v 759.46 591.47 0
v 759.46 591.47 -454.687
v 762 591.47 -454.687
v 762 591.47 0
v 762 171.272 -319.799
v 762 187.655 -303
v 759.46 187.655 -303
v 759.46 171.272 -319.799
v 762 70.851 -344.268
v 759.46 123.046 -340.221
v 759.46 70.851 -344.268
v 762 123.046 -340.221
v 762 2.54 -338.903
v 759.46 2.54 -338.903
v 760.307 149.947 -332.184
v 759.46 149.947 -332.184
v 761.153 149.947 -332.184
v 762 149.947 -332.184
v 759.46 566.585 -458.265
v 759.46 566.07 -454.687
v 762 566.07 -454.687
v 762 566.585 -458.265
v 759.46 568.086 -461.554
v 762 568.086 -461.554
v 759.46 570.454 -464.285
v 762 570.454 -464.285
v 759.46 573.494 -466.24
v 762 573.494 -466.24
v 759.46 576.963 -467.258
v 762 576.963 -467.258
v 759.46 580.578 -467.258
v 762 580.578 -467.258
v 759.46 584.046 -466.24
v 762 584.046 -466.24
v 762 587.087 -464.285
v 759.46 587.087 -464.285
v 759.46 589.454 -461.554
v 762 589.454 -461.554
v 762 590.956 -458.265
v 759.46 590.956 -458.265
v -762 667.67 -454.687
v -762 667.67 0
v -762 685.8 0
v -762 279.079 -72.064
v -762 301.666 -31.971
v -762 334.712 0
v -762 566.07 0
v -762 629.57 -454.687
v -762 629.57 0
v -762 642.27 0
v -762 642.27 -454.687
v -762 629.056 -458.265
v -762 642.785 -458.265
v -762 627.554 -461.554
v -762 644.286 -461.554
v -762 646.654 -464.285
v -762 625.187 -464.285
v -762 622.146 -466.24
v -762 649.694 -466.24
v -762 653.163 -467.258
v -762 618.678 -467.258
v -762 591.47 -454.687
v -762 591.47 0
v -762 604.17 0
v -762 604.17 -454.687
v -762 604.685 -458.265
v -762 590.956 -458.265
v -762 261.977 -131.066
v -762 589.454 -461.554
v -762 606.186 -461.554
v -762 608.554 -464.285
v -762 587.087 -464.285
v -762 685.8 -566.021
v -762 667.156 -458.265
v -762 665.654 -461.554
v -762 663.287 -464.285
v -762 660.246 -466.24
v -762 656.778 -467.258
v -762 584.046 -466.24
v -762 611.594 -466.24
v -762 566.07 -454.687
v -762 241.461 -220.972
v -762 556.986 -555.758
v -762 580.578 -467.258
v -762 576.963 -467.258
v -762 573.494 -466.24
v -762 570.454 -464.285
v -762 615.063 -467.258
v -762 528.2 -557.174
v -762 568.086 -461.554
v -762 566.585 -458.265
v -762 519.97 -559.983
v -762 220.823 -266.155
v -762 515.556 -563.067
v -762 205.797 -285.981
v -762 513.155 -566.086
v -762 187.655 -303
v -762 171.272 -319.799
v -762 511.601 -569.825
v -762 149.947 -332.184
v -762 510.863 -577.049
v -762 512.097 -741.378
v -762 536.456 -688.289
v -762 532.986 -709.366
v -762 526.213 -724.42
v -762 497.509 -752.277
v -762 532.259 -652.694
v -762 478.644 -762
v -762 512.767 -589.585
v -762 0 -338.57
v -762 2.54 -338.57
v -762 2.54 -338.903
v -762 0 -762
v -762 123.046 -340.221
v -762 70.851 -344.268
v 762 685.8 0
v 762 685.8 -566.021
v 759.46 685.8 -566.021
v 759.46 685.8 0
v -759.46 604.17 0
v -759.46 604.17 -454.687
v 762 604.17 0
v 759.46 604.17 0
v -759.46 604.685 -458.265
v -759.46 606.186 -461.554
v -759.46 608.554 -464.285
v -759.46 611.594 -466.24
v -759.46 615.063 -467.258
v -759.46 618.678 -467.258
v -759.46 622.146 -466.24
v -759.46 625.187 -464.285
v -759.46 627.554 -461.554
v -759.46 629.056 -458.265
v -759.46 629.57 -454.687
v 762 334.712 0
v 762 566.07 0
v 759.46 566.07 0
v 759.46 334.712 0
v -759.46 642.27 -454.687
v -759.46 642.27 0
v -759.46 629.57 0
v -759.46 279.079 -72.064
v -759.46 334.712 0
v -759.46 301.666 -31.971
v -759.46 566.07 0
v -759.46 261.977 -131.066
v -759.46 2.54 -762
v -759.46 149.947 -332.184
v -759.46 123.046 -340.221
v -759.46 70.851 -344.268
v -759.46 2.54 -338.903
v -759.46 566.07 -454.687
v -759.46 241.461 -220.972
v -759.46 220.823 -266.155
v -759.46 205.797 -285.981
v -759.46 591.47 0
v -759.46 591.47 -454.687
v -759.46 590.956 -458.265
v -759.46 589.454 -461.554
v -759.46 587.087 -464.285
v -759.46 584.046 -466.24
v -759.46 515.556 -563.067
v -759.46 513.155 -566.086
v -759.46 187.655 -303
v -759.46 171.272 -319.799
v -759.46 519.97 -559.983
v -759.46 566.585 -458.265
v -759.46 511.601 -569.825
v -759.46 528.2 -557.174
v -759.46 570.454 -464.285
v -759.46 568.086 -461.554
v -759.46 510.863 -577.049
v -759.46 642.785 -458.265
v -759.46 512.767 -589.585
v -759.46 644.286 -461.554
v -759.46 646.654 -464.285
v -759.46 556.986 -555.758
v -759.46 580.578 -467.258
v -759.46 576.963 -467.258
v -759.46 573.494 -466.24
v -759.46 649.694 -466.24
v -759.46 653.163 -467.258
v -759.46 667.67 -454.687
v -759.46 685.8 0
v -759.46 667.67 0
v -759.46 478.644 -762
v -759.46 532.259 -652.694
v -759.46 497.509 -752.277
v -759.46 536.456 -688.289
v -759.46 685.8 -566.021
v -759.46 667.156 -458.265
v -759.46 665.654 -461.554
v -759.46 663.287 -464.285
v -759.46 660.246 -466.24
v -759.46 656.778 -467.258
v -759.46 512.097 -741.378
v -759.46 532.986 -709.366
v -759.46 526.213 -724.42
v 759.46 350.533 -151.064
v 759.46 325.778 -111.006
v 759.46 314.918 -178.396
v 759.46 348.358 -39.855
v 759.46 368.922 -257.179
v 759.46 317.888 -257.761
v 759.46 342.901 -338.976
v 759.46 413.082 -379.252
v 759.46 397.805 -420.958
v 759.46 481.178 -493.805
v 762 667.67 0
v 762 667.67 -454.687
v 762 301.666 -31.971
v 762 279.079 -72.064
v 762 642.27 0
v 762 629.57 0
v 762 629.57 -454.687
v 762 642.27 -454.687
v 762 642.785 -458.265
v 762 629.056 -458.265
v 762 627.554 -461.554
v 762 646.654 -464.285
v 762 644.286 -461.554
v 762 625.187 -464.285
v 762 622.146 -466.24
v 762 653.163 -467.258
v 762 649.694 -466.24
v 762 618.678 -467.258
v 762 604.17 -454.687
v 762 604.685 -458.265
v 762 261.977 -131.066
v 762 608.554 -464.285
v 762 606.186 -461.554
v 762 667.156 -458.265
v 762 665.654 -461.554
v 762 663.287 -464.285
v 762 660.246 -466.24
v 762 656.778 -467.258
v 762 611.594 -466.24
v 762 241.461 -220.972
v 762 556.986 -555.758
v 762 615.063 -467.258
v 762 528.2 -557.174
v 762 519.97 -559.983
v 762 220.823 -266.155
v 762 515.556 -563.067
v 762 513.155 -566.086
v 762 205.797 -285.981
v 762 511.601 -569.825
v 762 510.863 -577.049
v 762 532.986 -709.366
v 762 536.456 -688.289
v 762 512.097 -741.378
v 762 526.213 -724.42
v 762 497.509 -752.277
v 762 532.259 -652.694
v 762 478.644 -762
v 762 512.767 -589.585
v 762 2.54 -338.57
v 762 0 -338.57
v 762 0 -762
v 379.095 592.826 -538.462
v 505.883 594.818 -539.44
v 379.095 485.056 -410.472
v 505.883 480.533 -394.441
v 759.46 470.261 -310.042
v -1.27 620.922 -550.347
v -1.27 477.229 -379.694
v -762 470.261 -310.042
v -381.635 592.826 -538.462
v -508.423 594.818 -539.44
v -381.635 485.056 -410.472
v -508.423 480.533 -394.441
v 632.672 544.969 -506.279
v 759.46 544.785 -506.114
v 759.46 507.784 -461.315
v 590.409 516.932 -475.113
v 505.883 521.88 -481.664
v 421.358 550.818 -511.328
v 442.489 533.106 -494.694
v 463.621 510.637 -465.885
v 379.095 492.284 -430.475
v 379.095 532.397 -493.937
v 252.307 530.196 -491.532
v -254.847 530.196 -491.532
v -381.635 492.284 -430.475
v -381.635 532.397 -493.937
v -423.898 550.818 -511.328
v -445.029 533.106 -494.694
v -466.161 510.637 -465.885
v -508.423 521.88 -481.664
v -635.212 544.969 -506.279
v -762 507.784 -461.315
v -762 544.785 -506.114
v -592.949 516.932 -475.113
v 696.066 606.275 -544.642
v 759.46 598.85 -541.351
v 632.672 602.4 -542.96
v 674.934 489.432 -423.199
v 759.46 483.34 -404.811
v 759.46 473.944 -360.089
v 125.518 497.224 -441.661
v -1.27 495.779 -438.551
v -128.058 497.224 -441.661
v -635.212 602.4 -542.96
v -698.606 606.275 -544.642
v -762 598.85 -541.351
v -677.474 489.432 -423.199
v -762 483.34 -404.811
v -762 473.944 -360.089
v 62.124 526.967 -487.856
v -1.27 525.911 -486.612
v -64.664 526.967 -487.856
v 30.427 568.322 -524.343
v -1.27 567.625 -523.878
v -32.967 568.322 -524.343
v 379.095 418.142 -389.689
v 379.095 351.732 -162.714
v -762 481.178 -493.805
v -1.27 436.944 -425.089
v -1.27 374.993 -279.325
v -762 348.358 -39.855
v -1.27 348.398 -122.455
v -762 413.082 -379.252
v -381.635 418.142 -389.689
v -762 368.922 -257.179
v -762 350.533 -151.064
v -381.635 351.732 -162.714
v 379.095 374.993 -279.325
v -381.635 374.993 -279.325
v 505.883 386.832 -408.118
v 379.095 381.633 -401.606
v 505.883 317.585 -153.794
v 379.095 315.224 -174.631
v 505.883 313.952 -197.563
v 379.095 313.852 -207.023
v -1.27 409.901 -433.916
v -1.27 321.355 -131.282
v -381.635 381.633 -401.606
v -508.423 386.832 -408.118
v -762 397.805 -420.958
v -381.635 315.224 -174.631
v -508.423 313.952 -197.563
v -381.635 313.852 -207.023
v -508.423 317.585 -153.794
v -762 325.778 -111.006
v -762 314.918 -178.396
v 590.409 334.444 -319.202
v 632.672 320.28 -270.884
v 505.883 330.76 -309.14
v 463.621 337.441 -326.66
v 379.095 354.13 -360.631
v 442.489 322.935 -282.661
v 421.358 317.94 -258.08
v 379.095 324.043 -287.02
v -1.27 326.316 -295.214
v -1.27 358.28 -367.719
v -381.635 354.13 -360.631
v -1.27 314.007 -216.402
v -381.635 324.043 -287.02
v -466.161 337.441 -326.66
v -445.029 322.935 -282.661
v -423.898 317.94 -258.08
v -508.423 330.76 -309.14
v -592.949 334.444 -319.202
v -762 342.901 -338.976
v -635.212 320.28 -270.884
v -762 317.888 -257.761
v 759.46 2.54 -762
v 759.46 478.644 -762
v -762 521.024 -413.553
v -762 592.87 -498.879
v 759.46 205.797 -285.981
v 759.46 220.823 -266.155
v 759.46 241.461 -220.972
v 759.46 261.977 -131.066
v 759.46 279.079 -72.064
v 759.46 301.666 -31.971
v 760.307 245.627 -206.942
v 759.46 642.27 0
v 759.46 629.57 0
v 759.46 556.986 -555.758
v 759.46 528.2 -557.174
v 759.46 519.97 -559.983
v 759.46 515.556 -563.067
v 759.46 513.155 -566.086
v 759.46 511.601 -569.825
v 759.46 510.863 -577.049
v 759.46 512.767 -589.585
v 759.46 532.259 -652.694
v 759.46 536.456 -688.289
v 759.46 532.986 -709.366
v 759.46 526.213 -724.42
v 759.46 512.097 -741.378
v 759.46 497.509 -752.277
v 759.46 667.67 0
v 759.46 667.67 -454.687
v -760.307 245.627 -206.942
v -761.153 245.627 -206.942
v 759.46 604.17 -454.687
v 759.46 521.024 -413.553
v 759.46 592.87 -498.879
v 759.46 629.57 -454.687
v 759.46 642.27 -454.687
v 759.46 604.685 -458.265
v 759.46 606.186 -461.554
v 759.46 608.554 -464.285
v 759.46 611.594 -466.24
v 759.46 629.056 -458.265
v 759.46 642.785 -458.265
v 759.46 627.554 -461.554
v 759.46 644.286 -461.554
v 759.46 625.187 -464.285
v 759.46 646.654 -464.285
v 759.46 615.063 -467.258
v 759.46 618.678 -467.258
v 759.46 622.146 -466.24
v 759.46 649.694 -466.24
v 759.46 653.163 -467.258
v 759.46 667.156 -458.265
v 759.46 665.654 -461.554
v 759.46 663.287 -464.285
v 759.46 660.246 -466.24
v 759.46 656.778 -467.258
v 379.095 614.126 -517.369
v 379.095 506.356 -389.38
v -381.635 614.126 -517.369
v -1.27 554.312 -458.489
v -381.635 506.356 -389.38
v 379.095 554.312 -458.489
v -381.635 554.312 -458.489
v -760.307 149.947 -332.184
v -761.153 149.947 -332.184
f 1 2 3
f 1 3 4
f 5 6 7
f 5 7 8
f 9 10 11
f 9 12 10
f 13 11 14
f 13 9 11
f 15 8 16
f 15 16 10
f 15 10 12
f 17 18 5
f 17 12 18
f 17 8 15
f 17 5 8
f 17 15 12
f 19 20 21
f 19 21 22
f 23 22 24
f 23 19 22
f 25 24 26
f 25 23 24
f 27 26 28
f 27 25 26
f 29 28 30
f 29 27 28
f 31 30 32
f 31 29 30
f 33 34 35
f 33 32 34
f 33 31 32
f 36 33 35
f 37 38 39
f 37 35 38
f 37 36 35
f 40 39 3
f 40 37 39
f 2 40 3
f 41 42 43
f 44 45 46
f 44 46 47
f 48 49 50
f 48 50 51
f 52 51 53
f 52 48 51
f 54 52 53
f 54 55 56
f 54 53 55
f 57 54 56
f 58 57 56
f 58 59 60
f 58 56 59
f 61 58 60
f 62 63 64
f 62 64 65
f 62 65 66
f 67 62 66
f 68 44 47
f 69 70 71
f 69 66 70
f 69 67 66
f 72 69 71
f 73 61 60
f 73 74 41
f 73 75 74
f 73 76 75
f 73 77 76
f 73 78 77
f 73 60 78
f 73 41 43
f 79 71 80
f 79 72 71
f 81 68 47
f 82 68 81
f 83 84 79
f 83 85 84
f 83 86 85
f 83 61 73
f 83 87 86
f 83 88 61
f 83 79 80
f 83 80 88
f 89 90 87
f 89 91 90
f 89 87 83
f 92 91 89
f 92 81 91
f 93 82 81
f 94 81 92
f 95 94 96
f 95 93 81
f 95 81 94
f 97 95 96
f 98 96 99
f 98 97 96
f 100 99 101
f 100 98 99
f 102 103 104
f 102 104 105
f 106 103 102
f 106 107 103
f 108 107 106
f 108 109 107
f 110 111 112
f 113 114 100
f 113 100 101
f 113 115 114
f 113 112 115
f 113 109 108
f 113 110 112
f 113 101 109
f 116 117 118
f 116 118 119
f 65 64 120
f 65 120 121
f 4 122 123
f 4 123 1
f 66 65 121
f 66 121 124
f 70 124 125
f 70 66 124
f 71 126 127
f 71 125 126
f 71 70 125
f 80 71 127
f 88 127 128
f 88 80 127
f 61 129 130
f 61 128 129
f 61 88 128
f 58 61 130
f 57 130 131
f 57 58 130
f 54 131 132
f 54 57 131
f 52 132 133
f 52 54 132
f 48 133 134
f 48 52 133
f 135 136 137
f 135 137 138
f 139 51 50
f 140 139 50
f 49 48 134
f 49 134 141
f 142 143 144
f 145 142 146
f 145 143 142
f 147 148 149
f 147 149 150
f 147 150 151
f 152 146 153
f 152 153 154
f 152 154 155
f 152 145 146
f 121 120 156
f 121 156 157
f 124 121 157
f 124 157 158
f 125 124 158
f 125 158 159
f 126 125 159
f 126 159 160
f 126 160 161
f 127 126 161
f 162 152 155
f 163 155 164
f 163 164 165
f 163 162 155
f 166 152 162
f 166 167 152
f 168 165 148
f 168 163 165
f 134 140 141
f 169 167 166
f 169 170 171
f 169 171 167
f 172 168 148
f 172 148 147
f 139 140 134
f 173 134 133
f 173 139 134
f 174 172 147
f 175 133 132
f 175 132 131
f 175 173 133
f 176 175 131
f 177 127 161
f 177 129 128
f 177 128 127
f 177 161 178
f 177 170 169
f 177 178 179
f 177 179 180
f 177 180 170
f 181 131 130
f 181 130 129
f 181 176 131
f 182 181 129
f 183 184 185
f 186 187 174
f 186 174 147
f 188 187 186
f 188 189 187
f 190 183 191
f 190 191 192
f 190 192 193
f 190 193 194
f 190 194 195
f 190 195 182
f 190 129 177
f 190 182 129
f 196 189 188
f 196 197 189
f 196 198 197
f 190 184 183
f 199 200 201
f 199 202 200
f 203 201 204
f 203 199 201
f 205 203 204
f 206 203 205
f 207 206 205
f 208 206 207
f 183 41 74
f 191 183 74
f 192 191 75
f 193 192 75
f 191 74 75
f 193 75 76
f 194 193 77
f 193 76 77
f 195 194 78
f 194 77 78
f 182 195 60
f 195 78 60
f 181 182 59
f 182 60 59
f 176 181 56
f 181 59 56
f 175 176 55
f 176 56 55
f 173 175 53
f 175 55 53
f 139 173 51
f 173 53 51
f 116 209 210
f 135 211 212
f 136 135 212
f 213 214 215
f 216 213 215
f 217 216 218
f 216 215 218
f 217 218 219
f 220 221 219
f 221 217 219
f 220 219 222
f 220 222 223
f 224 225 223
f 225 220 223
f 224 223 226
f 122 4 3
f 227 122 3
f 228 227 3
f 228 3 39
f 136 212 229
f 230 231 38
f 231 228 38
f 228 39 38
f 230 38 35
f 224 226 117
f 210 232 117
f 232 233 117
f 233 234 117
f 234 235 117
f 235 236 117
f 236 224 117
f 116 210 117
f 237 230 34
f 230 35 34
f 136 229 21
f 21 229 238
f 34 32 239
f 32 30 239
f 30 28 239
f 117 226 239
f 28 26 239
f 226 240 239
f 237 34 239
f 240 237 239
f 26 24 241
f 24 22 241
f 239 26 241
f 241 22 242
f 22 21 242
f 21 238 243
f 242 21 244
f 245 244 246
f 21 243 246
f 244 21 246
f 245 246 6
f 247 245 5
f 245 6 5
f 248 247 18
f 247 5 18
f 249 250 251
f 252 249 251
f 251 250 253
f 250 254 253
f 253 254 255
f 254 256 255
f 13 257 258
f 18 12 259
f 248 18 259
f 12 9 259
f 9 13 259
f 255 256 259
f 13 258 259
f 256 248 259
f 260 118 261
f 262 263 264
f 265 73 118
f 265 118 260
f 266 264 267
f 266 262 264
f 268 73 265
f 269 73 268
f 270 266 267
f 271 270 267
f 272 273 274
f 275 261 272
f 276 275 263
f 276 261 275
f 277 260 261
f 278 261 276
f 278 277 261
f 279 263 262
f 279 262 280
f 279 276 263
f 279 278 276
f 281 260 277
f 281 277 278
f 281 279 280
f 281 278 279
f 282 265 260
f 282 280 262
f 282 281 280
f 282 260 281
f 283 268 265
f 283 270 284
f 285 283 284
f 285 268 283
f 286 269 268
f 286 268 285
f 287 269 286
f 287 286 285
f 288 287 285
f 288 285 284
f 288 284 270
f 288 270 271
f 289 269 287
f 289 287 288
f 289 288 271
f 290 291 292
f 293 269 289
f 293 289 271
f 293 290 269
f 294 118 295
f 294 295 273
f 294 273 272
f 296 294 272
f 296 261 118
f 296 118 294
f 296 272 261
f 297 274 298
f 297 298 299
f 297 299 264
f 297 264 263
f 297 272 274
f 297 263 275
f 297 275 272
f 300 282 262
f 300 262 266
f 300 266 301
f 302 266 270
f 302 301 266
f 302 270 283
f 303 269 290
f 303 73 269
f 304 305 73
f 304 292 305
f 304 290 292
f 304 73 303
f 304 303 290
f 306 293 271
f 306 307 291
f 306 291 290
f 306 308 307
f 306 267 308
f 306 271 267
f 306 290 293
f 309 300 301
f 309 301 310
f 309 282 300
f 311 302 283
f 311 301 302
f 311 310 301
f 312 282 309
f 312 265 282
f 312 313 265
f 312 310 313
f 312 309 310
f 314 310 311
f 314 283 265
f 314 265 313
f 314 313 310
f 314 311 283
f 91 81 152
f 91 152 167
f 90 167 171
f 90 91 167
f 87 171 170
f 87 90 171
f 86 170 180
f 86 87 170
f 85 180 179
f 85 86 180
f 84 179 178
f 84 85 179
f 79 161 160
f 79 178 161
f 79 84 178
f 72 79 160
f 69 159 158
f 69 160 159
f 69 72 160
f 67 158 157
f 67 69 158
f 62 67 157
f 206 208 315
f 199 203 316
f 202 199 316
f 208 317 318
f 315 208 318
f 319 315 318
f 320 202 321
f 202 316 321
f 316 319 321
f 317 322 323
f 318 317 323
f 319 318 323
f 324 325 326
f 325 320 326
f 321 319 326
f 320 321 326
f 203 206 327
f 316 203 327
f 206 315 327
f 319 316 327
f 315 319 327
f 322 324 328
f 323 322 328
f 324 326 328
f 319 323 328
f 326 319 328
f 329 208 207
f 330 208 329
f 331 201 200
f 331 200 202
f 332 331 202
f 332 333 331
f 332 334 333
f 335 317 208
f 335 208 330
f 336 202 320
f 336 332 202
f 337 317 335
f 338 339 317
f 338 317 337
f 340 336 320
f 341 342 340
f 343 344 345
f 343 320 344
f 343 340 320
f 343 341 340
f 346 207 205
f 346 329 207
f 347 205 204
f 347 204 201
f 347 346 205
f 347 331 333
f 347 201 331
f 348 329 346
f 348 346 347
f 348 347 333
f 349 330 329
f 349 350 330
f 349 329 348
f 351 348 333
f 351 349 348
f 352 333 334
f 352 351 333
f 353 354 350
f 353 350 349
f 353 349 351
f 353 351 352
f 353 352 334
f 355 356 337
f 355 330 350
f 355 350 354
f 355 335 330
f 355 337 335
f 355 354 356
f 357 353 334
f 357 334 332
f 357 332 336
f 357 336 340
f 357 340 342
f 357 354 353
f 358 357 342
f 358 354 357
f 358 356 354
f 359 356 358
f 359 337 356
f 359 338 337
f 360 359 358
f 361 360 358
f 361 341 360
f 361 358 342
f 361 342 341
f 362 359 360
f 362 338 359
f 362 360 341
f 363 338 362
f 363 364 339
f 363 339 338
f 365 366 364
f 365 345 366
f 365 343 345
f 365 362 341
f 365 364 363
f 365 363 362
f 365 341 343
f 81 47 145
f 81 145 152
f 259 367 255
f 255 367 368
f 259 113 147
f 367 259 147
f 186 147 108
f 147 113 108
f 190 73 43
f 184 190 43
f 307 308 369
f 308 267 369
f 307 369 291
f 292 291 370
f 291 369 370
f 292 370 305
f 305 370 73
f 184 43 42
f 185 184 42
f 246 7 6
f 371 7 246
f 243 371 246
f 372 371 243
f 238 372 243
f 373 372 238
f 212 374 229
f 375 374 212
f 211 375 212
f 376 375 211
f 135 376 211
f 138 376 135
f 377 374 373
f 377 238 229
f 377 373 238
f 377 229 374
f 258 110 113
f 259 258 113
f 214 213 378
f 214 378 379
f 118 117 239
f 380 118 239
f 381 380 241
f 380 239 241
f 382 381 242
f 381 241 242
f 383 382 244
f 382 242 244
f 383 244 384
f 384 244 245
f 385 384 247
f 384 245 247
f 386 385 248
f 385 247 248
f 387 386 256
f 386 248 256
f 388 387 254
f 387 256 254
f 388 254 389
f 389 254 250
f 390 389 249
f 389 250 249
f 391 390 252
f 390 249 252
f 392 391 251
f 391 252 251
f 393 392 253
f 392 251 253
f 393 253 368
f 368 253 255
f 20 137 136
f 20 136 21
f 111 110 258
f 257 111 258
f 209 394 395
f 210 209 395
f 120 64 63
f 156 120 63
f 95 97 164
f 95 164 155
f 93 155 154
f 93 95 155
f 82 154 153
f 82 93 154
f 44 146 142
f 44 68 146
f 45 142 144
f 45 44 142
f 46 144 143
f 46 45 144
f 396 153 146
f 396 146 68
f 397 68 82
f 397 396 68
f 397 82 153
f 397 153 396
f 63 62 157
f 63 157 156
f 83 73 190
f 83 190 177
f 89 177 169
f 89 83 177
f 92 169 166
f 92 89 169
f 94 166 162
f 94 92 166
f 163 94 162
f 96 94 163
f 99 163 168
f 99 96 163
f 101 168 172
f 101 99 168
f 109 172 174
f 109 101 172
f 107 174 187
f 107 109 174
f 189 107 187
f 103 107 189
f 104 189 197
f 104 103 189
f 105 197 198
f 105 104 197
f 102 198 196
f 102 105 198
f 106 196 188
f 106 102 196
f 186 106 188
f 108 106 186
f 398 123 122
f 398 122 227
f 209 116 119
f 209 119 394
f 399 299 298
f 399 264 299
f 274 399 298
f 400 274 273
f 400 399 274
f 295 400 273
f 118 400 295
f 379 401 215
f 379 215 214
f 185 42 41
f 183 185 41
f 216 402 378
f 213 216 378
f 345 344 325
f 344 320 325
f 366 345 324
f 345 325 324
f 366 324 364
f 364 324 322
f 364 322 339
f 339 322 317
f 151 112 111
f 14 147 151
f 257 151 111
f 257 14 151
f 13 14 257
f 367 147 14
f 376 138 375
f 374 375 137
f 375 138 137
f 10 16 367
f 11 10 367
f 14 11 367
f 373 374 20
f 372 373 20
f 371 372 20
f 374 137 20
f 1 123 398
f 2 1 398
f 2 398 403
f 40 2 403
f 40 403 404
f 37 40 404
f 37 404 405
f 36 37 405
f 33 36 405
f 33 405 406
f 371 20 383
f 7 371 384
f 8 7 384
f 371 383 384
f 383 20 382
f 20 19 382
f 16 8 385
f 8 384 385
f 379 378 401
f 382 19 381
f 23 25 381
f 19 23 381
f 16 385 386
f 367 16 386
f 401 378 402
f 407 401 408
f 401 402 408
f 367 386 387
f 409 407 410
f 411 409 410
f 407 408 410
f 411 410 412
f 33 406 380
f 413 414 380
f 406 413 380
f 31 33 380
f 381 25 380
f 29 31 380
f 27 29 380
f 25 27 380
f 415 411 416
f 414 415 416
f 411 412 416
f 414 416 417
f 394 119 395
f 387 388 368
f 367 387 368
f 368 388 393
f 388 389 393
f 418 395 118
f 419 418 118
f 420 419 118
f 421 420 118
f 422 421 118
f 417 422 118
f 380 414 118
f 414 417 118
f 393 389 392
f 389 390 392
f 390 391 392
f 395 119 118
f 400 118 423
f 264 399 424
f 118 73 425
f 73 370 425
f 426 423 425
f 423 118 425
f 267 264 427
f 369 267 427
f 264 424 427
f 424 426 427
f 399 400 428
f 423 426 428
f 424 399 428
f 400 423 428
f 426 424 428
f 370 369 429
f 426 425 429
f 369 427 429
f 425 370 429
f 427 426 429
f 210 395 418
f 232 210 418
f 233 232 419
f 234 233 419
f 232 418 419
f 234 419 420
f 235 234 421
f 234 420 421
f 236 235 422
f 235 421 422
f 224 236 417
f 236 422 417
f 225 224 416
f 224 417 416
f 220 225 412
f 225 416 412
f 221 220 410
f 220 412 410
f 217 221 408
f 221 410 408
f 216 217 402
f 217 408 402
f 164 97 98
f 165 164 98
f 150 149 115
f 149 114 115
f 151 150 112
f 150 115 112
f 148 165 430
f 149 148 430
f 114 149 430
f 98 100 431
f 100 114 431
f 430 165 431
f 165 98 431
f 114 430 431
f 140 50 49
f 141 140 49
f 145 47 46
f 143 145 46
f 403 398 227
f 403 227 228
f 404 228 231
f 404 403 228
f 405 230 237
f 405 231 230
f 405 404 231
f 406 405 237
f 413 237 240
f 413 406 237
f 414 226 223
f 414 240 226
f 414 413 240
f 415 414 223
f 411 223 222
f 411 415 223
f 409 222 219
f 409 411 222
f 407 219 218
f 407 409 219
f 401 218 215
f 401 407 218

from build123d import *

# Parameters (mm, degrees)
BOSS_EXTRUDE1_START        = 762
BOSS_EXTRUDE1_DEPTH        = 2.54
BOSS_EXTRUDE3_DEPTH        = 759.46
BOSS_EXTRUDE3_DEPTH_BACK   = 762
BOSS_EXTRUDE3_2_DEPTH      = 759.46
BOSS_EXTRUDE3_2_DEPTH_BACK = 762
SKETCH13_W                 = 1524
SKETCH13_H                 = 423.429853573
BOSS_EXTRUDE4_DEPTH        = 2.54
CUT_EXTRUDE1_DEPTH         = 1278.344761778
CUT_EXTRUDE1_DEPTH_BACK    = 1278.344761778
CUT_EXTRUDE2_DEPTH         = 1278.344761778
CUT_EXTRUDE2_DEPTH_BACK    = 1278.344761778


with BuildPart() as part:
    # Sketch3 → Boss-Extrude1 (new body)
    with BuildSketch(Plane(origin=(0, 0, 0), x_dir=(0, 0, -1), z_dir=(1, 0, 0)).offset(BOSS_EXTRUDE1_START)):
        with BuildLine():
            Line((338.570146427, 0), (762, 0))
            Line((762, 0), (762, 478.643823899))
            add(Edge.make_bspline(
                [(566.02119263, 685.8), (566.02119263, 609.562833411), (511.018643959, 418.064816879), (711.566045078, 596.214023542), (762, 478.643823899)],
                knots=[0, 0, 0, 0, 0.43337684, 1, 1, 1, 1], degree=3))
            Line((566.02119263, 685.8), (0, 685.8))
            Line((0, 685.8), (0, 216.97447871))
            add(Edge.make_bspline(
                [(0, 216.97447871), (268.153594246, 216.97447871), (370.795901917, 243.07894269), (338.570146427, 0)],
                knots=[0, 0, 0, 0, 1, 1, 1, 1], degree=3))
        make_face()
    extrude(amount=-BOSS_EXTRUDE1_DEPTH)


with BuildPart() as body_2:
    # Mirror1: mirrored copy
    add(part.part.mirror(Plane(origin=(0, 0, 0), x_dir=(0, 0, 1), z_dir=(1, 0, 0))))


with BuildPart() as body_3:
    # Sketch8 → Boss-Extrude3 (new, two sides: drawn at the far end of the back side and taken through both)
    with BuildSketch(Plane(origin=(0, 0, 0), x_dir=(0, 0, -1), z_dir=(1, 0, 0)).offset(-BOSS_EXTRUDE3_DEPTH_BACK)):
        with BuildLine():
            add(Edge.make_bspline(
                [(566.02119263, 685.8), (478.94605907, 530.59259106), (310.041791286, 470.260887435)],
                knots=[0, 0, 0, 1, 1, 1], degree=2))
            add(Edge.make_bspline(
                [(566.02119263, 685.8), (535.192963113, 473.791997419), (310.041791286, 470.260887435)],
                knots=[0, 0, 0, 1, 1, 1], degree=2))
        make_face()
    extrude(amount=BOSS_EXTRUDE3_DEPTH + BOSS_EXTRUDE3_DEPTH_BACK)


with BuildPart() as body_4:
    # Sketch8 → Boss-Extrude3 2 (new, two sides: drawn at the far end of the back side and taken through both)
    with BuildSketch(Plane(origin=(0, 0, 0), x_dir=(0, 0, -1), z_dir=(1, 0, 0)).offset(-BOSS_EXTRUDE3_2_DEPTH_BACK)):
        with BuildLine():
            add(Edge.make_bspline(
                [(493.805357443, 481.17753493), (291.820165627, 335.217986135), (39.854765798, 348.358323747)],
                knots=[0, 0, 0, 1, 1, 1], degree=2))
            add(Edge.make_bspline(
                [(493.805357443, 481.17753493), (323.598432885, 237.863082713), (39.854765798, 348.358323747)],
                knots=[0, 0, 0, 1, 1, 1], degree=2))
        make_face()
    extrude(amount=BOSS_EXTRUDE3_2_DEPTH + BOSS_EXTRUDE3_2_DEPTH_BACK)


with BuildPart() as part_1:
    add(part.part)

    add(body_2.part)  # Boss-Extrude4 merges body 2
    # Sketch13 → Boss-Extrude4 (add)
    with BuildSketch(Plane(origin=(0, 0, 0), x_dir=(1, 0, 0), z_dir=(0, 1, 0))):
        with Locations((0, 550.285073214)):
            Rectangle(SKETCH13_W, SKETCH13_H)
    extrude(amount=BOSS_EXTRUDE4_DEPTH)

    # Sketch16 → Cut-Extrude1 (cut, two sides: drawn at the far end of the back side and taken through both)
    with BuildSketch(Plane(origin=(0, 0, 0), x_dir=(0, 0, -1), z_dir=(1, 0, 0)).offset(-CUT_EXTRUDE1_DEPTH_BACK)):
        with BuildLine():
            Line((0, 667.670249742), (454.687424311, 667.670249742))
            ThreePointArc((454.687424311, 667.670249742), (467.387424311, 654.970249742), (454.687424311, 642.270249742))
            Line((454.687424311, 642.270249742), (0, 642.270249742))
            ThreePointArc((0, 642.270249742), (-12.7, 654.970249742), (0, 667.670249742))
        make_face()
        with BuildLine():
            Line((0, 604.170249742), (454.687424311, 604.170249742))
            ThreePointArc((454.687424311, 604.170249742), (467.387424311, 616.870249742), (454.687424311, 629.570249742))
            Line((454.687424311, 629.570249742), (0, 629.570249742))
            ThreePointArc((0, 629.570249742), (-12.7, 616.870249742), (0, 604.170249742))
        make_face()
        with BuildLine():
            Line((0, 566.070249742), (454.687424311, 566.070249742))
            ThreePointArc((454.687424311, 566.070249742), (467.387424311, 578.770249742), (454.687424311, 591.470249742))
            Line((454.687424311, 591.470249742), (0, 591.470249742))
            ThreePointArc((0, 591.470249742), (-12.7, 578.770249742), (0, 566.070249742))
        make_face()
    extrude(amount=CUT_EXTRUDE1_DEPTH + CUT_EXTRUDE1_DEPTH_BACK, mode=Mode.SUBTRACT)

    # Sketch17 → Cut-Extrude2 (cut, two sides: drawn at the far end of the back side and taken through both)
    with BuildSketch(Plane(origin=(0, 0, 0), x_dir=(0, 0, -1), z_dir=(1, 0, 0)).offset(-CUT_EXTRUDE2_DEPTH_BACK)):
        with BuildLine():
            Line((0, 334.71225841), (0, 103.643051311))
            Line((0, 103.643051311), (302.999558796, 187.654799067))
            add(Edge.make_bspline(
                [(302.999558796, 187.654799067), (225.21849282, 285.739628908), (76.800772912, 227.85117527), (0, 334.71225841)],
                knots=[0, 0, 0, 0, 1, 1, 1, 1], degree=3))
        make_face()
    extrude(amount=CUT_EXTRUDE2_DEPTH + CUT_EXTRUDE2_DEPTH_BACK, mode=Mode.SUBTRACT)


solid = Compound([body_3.part, body_4.part, part_1.part])
